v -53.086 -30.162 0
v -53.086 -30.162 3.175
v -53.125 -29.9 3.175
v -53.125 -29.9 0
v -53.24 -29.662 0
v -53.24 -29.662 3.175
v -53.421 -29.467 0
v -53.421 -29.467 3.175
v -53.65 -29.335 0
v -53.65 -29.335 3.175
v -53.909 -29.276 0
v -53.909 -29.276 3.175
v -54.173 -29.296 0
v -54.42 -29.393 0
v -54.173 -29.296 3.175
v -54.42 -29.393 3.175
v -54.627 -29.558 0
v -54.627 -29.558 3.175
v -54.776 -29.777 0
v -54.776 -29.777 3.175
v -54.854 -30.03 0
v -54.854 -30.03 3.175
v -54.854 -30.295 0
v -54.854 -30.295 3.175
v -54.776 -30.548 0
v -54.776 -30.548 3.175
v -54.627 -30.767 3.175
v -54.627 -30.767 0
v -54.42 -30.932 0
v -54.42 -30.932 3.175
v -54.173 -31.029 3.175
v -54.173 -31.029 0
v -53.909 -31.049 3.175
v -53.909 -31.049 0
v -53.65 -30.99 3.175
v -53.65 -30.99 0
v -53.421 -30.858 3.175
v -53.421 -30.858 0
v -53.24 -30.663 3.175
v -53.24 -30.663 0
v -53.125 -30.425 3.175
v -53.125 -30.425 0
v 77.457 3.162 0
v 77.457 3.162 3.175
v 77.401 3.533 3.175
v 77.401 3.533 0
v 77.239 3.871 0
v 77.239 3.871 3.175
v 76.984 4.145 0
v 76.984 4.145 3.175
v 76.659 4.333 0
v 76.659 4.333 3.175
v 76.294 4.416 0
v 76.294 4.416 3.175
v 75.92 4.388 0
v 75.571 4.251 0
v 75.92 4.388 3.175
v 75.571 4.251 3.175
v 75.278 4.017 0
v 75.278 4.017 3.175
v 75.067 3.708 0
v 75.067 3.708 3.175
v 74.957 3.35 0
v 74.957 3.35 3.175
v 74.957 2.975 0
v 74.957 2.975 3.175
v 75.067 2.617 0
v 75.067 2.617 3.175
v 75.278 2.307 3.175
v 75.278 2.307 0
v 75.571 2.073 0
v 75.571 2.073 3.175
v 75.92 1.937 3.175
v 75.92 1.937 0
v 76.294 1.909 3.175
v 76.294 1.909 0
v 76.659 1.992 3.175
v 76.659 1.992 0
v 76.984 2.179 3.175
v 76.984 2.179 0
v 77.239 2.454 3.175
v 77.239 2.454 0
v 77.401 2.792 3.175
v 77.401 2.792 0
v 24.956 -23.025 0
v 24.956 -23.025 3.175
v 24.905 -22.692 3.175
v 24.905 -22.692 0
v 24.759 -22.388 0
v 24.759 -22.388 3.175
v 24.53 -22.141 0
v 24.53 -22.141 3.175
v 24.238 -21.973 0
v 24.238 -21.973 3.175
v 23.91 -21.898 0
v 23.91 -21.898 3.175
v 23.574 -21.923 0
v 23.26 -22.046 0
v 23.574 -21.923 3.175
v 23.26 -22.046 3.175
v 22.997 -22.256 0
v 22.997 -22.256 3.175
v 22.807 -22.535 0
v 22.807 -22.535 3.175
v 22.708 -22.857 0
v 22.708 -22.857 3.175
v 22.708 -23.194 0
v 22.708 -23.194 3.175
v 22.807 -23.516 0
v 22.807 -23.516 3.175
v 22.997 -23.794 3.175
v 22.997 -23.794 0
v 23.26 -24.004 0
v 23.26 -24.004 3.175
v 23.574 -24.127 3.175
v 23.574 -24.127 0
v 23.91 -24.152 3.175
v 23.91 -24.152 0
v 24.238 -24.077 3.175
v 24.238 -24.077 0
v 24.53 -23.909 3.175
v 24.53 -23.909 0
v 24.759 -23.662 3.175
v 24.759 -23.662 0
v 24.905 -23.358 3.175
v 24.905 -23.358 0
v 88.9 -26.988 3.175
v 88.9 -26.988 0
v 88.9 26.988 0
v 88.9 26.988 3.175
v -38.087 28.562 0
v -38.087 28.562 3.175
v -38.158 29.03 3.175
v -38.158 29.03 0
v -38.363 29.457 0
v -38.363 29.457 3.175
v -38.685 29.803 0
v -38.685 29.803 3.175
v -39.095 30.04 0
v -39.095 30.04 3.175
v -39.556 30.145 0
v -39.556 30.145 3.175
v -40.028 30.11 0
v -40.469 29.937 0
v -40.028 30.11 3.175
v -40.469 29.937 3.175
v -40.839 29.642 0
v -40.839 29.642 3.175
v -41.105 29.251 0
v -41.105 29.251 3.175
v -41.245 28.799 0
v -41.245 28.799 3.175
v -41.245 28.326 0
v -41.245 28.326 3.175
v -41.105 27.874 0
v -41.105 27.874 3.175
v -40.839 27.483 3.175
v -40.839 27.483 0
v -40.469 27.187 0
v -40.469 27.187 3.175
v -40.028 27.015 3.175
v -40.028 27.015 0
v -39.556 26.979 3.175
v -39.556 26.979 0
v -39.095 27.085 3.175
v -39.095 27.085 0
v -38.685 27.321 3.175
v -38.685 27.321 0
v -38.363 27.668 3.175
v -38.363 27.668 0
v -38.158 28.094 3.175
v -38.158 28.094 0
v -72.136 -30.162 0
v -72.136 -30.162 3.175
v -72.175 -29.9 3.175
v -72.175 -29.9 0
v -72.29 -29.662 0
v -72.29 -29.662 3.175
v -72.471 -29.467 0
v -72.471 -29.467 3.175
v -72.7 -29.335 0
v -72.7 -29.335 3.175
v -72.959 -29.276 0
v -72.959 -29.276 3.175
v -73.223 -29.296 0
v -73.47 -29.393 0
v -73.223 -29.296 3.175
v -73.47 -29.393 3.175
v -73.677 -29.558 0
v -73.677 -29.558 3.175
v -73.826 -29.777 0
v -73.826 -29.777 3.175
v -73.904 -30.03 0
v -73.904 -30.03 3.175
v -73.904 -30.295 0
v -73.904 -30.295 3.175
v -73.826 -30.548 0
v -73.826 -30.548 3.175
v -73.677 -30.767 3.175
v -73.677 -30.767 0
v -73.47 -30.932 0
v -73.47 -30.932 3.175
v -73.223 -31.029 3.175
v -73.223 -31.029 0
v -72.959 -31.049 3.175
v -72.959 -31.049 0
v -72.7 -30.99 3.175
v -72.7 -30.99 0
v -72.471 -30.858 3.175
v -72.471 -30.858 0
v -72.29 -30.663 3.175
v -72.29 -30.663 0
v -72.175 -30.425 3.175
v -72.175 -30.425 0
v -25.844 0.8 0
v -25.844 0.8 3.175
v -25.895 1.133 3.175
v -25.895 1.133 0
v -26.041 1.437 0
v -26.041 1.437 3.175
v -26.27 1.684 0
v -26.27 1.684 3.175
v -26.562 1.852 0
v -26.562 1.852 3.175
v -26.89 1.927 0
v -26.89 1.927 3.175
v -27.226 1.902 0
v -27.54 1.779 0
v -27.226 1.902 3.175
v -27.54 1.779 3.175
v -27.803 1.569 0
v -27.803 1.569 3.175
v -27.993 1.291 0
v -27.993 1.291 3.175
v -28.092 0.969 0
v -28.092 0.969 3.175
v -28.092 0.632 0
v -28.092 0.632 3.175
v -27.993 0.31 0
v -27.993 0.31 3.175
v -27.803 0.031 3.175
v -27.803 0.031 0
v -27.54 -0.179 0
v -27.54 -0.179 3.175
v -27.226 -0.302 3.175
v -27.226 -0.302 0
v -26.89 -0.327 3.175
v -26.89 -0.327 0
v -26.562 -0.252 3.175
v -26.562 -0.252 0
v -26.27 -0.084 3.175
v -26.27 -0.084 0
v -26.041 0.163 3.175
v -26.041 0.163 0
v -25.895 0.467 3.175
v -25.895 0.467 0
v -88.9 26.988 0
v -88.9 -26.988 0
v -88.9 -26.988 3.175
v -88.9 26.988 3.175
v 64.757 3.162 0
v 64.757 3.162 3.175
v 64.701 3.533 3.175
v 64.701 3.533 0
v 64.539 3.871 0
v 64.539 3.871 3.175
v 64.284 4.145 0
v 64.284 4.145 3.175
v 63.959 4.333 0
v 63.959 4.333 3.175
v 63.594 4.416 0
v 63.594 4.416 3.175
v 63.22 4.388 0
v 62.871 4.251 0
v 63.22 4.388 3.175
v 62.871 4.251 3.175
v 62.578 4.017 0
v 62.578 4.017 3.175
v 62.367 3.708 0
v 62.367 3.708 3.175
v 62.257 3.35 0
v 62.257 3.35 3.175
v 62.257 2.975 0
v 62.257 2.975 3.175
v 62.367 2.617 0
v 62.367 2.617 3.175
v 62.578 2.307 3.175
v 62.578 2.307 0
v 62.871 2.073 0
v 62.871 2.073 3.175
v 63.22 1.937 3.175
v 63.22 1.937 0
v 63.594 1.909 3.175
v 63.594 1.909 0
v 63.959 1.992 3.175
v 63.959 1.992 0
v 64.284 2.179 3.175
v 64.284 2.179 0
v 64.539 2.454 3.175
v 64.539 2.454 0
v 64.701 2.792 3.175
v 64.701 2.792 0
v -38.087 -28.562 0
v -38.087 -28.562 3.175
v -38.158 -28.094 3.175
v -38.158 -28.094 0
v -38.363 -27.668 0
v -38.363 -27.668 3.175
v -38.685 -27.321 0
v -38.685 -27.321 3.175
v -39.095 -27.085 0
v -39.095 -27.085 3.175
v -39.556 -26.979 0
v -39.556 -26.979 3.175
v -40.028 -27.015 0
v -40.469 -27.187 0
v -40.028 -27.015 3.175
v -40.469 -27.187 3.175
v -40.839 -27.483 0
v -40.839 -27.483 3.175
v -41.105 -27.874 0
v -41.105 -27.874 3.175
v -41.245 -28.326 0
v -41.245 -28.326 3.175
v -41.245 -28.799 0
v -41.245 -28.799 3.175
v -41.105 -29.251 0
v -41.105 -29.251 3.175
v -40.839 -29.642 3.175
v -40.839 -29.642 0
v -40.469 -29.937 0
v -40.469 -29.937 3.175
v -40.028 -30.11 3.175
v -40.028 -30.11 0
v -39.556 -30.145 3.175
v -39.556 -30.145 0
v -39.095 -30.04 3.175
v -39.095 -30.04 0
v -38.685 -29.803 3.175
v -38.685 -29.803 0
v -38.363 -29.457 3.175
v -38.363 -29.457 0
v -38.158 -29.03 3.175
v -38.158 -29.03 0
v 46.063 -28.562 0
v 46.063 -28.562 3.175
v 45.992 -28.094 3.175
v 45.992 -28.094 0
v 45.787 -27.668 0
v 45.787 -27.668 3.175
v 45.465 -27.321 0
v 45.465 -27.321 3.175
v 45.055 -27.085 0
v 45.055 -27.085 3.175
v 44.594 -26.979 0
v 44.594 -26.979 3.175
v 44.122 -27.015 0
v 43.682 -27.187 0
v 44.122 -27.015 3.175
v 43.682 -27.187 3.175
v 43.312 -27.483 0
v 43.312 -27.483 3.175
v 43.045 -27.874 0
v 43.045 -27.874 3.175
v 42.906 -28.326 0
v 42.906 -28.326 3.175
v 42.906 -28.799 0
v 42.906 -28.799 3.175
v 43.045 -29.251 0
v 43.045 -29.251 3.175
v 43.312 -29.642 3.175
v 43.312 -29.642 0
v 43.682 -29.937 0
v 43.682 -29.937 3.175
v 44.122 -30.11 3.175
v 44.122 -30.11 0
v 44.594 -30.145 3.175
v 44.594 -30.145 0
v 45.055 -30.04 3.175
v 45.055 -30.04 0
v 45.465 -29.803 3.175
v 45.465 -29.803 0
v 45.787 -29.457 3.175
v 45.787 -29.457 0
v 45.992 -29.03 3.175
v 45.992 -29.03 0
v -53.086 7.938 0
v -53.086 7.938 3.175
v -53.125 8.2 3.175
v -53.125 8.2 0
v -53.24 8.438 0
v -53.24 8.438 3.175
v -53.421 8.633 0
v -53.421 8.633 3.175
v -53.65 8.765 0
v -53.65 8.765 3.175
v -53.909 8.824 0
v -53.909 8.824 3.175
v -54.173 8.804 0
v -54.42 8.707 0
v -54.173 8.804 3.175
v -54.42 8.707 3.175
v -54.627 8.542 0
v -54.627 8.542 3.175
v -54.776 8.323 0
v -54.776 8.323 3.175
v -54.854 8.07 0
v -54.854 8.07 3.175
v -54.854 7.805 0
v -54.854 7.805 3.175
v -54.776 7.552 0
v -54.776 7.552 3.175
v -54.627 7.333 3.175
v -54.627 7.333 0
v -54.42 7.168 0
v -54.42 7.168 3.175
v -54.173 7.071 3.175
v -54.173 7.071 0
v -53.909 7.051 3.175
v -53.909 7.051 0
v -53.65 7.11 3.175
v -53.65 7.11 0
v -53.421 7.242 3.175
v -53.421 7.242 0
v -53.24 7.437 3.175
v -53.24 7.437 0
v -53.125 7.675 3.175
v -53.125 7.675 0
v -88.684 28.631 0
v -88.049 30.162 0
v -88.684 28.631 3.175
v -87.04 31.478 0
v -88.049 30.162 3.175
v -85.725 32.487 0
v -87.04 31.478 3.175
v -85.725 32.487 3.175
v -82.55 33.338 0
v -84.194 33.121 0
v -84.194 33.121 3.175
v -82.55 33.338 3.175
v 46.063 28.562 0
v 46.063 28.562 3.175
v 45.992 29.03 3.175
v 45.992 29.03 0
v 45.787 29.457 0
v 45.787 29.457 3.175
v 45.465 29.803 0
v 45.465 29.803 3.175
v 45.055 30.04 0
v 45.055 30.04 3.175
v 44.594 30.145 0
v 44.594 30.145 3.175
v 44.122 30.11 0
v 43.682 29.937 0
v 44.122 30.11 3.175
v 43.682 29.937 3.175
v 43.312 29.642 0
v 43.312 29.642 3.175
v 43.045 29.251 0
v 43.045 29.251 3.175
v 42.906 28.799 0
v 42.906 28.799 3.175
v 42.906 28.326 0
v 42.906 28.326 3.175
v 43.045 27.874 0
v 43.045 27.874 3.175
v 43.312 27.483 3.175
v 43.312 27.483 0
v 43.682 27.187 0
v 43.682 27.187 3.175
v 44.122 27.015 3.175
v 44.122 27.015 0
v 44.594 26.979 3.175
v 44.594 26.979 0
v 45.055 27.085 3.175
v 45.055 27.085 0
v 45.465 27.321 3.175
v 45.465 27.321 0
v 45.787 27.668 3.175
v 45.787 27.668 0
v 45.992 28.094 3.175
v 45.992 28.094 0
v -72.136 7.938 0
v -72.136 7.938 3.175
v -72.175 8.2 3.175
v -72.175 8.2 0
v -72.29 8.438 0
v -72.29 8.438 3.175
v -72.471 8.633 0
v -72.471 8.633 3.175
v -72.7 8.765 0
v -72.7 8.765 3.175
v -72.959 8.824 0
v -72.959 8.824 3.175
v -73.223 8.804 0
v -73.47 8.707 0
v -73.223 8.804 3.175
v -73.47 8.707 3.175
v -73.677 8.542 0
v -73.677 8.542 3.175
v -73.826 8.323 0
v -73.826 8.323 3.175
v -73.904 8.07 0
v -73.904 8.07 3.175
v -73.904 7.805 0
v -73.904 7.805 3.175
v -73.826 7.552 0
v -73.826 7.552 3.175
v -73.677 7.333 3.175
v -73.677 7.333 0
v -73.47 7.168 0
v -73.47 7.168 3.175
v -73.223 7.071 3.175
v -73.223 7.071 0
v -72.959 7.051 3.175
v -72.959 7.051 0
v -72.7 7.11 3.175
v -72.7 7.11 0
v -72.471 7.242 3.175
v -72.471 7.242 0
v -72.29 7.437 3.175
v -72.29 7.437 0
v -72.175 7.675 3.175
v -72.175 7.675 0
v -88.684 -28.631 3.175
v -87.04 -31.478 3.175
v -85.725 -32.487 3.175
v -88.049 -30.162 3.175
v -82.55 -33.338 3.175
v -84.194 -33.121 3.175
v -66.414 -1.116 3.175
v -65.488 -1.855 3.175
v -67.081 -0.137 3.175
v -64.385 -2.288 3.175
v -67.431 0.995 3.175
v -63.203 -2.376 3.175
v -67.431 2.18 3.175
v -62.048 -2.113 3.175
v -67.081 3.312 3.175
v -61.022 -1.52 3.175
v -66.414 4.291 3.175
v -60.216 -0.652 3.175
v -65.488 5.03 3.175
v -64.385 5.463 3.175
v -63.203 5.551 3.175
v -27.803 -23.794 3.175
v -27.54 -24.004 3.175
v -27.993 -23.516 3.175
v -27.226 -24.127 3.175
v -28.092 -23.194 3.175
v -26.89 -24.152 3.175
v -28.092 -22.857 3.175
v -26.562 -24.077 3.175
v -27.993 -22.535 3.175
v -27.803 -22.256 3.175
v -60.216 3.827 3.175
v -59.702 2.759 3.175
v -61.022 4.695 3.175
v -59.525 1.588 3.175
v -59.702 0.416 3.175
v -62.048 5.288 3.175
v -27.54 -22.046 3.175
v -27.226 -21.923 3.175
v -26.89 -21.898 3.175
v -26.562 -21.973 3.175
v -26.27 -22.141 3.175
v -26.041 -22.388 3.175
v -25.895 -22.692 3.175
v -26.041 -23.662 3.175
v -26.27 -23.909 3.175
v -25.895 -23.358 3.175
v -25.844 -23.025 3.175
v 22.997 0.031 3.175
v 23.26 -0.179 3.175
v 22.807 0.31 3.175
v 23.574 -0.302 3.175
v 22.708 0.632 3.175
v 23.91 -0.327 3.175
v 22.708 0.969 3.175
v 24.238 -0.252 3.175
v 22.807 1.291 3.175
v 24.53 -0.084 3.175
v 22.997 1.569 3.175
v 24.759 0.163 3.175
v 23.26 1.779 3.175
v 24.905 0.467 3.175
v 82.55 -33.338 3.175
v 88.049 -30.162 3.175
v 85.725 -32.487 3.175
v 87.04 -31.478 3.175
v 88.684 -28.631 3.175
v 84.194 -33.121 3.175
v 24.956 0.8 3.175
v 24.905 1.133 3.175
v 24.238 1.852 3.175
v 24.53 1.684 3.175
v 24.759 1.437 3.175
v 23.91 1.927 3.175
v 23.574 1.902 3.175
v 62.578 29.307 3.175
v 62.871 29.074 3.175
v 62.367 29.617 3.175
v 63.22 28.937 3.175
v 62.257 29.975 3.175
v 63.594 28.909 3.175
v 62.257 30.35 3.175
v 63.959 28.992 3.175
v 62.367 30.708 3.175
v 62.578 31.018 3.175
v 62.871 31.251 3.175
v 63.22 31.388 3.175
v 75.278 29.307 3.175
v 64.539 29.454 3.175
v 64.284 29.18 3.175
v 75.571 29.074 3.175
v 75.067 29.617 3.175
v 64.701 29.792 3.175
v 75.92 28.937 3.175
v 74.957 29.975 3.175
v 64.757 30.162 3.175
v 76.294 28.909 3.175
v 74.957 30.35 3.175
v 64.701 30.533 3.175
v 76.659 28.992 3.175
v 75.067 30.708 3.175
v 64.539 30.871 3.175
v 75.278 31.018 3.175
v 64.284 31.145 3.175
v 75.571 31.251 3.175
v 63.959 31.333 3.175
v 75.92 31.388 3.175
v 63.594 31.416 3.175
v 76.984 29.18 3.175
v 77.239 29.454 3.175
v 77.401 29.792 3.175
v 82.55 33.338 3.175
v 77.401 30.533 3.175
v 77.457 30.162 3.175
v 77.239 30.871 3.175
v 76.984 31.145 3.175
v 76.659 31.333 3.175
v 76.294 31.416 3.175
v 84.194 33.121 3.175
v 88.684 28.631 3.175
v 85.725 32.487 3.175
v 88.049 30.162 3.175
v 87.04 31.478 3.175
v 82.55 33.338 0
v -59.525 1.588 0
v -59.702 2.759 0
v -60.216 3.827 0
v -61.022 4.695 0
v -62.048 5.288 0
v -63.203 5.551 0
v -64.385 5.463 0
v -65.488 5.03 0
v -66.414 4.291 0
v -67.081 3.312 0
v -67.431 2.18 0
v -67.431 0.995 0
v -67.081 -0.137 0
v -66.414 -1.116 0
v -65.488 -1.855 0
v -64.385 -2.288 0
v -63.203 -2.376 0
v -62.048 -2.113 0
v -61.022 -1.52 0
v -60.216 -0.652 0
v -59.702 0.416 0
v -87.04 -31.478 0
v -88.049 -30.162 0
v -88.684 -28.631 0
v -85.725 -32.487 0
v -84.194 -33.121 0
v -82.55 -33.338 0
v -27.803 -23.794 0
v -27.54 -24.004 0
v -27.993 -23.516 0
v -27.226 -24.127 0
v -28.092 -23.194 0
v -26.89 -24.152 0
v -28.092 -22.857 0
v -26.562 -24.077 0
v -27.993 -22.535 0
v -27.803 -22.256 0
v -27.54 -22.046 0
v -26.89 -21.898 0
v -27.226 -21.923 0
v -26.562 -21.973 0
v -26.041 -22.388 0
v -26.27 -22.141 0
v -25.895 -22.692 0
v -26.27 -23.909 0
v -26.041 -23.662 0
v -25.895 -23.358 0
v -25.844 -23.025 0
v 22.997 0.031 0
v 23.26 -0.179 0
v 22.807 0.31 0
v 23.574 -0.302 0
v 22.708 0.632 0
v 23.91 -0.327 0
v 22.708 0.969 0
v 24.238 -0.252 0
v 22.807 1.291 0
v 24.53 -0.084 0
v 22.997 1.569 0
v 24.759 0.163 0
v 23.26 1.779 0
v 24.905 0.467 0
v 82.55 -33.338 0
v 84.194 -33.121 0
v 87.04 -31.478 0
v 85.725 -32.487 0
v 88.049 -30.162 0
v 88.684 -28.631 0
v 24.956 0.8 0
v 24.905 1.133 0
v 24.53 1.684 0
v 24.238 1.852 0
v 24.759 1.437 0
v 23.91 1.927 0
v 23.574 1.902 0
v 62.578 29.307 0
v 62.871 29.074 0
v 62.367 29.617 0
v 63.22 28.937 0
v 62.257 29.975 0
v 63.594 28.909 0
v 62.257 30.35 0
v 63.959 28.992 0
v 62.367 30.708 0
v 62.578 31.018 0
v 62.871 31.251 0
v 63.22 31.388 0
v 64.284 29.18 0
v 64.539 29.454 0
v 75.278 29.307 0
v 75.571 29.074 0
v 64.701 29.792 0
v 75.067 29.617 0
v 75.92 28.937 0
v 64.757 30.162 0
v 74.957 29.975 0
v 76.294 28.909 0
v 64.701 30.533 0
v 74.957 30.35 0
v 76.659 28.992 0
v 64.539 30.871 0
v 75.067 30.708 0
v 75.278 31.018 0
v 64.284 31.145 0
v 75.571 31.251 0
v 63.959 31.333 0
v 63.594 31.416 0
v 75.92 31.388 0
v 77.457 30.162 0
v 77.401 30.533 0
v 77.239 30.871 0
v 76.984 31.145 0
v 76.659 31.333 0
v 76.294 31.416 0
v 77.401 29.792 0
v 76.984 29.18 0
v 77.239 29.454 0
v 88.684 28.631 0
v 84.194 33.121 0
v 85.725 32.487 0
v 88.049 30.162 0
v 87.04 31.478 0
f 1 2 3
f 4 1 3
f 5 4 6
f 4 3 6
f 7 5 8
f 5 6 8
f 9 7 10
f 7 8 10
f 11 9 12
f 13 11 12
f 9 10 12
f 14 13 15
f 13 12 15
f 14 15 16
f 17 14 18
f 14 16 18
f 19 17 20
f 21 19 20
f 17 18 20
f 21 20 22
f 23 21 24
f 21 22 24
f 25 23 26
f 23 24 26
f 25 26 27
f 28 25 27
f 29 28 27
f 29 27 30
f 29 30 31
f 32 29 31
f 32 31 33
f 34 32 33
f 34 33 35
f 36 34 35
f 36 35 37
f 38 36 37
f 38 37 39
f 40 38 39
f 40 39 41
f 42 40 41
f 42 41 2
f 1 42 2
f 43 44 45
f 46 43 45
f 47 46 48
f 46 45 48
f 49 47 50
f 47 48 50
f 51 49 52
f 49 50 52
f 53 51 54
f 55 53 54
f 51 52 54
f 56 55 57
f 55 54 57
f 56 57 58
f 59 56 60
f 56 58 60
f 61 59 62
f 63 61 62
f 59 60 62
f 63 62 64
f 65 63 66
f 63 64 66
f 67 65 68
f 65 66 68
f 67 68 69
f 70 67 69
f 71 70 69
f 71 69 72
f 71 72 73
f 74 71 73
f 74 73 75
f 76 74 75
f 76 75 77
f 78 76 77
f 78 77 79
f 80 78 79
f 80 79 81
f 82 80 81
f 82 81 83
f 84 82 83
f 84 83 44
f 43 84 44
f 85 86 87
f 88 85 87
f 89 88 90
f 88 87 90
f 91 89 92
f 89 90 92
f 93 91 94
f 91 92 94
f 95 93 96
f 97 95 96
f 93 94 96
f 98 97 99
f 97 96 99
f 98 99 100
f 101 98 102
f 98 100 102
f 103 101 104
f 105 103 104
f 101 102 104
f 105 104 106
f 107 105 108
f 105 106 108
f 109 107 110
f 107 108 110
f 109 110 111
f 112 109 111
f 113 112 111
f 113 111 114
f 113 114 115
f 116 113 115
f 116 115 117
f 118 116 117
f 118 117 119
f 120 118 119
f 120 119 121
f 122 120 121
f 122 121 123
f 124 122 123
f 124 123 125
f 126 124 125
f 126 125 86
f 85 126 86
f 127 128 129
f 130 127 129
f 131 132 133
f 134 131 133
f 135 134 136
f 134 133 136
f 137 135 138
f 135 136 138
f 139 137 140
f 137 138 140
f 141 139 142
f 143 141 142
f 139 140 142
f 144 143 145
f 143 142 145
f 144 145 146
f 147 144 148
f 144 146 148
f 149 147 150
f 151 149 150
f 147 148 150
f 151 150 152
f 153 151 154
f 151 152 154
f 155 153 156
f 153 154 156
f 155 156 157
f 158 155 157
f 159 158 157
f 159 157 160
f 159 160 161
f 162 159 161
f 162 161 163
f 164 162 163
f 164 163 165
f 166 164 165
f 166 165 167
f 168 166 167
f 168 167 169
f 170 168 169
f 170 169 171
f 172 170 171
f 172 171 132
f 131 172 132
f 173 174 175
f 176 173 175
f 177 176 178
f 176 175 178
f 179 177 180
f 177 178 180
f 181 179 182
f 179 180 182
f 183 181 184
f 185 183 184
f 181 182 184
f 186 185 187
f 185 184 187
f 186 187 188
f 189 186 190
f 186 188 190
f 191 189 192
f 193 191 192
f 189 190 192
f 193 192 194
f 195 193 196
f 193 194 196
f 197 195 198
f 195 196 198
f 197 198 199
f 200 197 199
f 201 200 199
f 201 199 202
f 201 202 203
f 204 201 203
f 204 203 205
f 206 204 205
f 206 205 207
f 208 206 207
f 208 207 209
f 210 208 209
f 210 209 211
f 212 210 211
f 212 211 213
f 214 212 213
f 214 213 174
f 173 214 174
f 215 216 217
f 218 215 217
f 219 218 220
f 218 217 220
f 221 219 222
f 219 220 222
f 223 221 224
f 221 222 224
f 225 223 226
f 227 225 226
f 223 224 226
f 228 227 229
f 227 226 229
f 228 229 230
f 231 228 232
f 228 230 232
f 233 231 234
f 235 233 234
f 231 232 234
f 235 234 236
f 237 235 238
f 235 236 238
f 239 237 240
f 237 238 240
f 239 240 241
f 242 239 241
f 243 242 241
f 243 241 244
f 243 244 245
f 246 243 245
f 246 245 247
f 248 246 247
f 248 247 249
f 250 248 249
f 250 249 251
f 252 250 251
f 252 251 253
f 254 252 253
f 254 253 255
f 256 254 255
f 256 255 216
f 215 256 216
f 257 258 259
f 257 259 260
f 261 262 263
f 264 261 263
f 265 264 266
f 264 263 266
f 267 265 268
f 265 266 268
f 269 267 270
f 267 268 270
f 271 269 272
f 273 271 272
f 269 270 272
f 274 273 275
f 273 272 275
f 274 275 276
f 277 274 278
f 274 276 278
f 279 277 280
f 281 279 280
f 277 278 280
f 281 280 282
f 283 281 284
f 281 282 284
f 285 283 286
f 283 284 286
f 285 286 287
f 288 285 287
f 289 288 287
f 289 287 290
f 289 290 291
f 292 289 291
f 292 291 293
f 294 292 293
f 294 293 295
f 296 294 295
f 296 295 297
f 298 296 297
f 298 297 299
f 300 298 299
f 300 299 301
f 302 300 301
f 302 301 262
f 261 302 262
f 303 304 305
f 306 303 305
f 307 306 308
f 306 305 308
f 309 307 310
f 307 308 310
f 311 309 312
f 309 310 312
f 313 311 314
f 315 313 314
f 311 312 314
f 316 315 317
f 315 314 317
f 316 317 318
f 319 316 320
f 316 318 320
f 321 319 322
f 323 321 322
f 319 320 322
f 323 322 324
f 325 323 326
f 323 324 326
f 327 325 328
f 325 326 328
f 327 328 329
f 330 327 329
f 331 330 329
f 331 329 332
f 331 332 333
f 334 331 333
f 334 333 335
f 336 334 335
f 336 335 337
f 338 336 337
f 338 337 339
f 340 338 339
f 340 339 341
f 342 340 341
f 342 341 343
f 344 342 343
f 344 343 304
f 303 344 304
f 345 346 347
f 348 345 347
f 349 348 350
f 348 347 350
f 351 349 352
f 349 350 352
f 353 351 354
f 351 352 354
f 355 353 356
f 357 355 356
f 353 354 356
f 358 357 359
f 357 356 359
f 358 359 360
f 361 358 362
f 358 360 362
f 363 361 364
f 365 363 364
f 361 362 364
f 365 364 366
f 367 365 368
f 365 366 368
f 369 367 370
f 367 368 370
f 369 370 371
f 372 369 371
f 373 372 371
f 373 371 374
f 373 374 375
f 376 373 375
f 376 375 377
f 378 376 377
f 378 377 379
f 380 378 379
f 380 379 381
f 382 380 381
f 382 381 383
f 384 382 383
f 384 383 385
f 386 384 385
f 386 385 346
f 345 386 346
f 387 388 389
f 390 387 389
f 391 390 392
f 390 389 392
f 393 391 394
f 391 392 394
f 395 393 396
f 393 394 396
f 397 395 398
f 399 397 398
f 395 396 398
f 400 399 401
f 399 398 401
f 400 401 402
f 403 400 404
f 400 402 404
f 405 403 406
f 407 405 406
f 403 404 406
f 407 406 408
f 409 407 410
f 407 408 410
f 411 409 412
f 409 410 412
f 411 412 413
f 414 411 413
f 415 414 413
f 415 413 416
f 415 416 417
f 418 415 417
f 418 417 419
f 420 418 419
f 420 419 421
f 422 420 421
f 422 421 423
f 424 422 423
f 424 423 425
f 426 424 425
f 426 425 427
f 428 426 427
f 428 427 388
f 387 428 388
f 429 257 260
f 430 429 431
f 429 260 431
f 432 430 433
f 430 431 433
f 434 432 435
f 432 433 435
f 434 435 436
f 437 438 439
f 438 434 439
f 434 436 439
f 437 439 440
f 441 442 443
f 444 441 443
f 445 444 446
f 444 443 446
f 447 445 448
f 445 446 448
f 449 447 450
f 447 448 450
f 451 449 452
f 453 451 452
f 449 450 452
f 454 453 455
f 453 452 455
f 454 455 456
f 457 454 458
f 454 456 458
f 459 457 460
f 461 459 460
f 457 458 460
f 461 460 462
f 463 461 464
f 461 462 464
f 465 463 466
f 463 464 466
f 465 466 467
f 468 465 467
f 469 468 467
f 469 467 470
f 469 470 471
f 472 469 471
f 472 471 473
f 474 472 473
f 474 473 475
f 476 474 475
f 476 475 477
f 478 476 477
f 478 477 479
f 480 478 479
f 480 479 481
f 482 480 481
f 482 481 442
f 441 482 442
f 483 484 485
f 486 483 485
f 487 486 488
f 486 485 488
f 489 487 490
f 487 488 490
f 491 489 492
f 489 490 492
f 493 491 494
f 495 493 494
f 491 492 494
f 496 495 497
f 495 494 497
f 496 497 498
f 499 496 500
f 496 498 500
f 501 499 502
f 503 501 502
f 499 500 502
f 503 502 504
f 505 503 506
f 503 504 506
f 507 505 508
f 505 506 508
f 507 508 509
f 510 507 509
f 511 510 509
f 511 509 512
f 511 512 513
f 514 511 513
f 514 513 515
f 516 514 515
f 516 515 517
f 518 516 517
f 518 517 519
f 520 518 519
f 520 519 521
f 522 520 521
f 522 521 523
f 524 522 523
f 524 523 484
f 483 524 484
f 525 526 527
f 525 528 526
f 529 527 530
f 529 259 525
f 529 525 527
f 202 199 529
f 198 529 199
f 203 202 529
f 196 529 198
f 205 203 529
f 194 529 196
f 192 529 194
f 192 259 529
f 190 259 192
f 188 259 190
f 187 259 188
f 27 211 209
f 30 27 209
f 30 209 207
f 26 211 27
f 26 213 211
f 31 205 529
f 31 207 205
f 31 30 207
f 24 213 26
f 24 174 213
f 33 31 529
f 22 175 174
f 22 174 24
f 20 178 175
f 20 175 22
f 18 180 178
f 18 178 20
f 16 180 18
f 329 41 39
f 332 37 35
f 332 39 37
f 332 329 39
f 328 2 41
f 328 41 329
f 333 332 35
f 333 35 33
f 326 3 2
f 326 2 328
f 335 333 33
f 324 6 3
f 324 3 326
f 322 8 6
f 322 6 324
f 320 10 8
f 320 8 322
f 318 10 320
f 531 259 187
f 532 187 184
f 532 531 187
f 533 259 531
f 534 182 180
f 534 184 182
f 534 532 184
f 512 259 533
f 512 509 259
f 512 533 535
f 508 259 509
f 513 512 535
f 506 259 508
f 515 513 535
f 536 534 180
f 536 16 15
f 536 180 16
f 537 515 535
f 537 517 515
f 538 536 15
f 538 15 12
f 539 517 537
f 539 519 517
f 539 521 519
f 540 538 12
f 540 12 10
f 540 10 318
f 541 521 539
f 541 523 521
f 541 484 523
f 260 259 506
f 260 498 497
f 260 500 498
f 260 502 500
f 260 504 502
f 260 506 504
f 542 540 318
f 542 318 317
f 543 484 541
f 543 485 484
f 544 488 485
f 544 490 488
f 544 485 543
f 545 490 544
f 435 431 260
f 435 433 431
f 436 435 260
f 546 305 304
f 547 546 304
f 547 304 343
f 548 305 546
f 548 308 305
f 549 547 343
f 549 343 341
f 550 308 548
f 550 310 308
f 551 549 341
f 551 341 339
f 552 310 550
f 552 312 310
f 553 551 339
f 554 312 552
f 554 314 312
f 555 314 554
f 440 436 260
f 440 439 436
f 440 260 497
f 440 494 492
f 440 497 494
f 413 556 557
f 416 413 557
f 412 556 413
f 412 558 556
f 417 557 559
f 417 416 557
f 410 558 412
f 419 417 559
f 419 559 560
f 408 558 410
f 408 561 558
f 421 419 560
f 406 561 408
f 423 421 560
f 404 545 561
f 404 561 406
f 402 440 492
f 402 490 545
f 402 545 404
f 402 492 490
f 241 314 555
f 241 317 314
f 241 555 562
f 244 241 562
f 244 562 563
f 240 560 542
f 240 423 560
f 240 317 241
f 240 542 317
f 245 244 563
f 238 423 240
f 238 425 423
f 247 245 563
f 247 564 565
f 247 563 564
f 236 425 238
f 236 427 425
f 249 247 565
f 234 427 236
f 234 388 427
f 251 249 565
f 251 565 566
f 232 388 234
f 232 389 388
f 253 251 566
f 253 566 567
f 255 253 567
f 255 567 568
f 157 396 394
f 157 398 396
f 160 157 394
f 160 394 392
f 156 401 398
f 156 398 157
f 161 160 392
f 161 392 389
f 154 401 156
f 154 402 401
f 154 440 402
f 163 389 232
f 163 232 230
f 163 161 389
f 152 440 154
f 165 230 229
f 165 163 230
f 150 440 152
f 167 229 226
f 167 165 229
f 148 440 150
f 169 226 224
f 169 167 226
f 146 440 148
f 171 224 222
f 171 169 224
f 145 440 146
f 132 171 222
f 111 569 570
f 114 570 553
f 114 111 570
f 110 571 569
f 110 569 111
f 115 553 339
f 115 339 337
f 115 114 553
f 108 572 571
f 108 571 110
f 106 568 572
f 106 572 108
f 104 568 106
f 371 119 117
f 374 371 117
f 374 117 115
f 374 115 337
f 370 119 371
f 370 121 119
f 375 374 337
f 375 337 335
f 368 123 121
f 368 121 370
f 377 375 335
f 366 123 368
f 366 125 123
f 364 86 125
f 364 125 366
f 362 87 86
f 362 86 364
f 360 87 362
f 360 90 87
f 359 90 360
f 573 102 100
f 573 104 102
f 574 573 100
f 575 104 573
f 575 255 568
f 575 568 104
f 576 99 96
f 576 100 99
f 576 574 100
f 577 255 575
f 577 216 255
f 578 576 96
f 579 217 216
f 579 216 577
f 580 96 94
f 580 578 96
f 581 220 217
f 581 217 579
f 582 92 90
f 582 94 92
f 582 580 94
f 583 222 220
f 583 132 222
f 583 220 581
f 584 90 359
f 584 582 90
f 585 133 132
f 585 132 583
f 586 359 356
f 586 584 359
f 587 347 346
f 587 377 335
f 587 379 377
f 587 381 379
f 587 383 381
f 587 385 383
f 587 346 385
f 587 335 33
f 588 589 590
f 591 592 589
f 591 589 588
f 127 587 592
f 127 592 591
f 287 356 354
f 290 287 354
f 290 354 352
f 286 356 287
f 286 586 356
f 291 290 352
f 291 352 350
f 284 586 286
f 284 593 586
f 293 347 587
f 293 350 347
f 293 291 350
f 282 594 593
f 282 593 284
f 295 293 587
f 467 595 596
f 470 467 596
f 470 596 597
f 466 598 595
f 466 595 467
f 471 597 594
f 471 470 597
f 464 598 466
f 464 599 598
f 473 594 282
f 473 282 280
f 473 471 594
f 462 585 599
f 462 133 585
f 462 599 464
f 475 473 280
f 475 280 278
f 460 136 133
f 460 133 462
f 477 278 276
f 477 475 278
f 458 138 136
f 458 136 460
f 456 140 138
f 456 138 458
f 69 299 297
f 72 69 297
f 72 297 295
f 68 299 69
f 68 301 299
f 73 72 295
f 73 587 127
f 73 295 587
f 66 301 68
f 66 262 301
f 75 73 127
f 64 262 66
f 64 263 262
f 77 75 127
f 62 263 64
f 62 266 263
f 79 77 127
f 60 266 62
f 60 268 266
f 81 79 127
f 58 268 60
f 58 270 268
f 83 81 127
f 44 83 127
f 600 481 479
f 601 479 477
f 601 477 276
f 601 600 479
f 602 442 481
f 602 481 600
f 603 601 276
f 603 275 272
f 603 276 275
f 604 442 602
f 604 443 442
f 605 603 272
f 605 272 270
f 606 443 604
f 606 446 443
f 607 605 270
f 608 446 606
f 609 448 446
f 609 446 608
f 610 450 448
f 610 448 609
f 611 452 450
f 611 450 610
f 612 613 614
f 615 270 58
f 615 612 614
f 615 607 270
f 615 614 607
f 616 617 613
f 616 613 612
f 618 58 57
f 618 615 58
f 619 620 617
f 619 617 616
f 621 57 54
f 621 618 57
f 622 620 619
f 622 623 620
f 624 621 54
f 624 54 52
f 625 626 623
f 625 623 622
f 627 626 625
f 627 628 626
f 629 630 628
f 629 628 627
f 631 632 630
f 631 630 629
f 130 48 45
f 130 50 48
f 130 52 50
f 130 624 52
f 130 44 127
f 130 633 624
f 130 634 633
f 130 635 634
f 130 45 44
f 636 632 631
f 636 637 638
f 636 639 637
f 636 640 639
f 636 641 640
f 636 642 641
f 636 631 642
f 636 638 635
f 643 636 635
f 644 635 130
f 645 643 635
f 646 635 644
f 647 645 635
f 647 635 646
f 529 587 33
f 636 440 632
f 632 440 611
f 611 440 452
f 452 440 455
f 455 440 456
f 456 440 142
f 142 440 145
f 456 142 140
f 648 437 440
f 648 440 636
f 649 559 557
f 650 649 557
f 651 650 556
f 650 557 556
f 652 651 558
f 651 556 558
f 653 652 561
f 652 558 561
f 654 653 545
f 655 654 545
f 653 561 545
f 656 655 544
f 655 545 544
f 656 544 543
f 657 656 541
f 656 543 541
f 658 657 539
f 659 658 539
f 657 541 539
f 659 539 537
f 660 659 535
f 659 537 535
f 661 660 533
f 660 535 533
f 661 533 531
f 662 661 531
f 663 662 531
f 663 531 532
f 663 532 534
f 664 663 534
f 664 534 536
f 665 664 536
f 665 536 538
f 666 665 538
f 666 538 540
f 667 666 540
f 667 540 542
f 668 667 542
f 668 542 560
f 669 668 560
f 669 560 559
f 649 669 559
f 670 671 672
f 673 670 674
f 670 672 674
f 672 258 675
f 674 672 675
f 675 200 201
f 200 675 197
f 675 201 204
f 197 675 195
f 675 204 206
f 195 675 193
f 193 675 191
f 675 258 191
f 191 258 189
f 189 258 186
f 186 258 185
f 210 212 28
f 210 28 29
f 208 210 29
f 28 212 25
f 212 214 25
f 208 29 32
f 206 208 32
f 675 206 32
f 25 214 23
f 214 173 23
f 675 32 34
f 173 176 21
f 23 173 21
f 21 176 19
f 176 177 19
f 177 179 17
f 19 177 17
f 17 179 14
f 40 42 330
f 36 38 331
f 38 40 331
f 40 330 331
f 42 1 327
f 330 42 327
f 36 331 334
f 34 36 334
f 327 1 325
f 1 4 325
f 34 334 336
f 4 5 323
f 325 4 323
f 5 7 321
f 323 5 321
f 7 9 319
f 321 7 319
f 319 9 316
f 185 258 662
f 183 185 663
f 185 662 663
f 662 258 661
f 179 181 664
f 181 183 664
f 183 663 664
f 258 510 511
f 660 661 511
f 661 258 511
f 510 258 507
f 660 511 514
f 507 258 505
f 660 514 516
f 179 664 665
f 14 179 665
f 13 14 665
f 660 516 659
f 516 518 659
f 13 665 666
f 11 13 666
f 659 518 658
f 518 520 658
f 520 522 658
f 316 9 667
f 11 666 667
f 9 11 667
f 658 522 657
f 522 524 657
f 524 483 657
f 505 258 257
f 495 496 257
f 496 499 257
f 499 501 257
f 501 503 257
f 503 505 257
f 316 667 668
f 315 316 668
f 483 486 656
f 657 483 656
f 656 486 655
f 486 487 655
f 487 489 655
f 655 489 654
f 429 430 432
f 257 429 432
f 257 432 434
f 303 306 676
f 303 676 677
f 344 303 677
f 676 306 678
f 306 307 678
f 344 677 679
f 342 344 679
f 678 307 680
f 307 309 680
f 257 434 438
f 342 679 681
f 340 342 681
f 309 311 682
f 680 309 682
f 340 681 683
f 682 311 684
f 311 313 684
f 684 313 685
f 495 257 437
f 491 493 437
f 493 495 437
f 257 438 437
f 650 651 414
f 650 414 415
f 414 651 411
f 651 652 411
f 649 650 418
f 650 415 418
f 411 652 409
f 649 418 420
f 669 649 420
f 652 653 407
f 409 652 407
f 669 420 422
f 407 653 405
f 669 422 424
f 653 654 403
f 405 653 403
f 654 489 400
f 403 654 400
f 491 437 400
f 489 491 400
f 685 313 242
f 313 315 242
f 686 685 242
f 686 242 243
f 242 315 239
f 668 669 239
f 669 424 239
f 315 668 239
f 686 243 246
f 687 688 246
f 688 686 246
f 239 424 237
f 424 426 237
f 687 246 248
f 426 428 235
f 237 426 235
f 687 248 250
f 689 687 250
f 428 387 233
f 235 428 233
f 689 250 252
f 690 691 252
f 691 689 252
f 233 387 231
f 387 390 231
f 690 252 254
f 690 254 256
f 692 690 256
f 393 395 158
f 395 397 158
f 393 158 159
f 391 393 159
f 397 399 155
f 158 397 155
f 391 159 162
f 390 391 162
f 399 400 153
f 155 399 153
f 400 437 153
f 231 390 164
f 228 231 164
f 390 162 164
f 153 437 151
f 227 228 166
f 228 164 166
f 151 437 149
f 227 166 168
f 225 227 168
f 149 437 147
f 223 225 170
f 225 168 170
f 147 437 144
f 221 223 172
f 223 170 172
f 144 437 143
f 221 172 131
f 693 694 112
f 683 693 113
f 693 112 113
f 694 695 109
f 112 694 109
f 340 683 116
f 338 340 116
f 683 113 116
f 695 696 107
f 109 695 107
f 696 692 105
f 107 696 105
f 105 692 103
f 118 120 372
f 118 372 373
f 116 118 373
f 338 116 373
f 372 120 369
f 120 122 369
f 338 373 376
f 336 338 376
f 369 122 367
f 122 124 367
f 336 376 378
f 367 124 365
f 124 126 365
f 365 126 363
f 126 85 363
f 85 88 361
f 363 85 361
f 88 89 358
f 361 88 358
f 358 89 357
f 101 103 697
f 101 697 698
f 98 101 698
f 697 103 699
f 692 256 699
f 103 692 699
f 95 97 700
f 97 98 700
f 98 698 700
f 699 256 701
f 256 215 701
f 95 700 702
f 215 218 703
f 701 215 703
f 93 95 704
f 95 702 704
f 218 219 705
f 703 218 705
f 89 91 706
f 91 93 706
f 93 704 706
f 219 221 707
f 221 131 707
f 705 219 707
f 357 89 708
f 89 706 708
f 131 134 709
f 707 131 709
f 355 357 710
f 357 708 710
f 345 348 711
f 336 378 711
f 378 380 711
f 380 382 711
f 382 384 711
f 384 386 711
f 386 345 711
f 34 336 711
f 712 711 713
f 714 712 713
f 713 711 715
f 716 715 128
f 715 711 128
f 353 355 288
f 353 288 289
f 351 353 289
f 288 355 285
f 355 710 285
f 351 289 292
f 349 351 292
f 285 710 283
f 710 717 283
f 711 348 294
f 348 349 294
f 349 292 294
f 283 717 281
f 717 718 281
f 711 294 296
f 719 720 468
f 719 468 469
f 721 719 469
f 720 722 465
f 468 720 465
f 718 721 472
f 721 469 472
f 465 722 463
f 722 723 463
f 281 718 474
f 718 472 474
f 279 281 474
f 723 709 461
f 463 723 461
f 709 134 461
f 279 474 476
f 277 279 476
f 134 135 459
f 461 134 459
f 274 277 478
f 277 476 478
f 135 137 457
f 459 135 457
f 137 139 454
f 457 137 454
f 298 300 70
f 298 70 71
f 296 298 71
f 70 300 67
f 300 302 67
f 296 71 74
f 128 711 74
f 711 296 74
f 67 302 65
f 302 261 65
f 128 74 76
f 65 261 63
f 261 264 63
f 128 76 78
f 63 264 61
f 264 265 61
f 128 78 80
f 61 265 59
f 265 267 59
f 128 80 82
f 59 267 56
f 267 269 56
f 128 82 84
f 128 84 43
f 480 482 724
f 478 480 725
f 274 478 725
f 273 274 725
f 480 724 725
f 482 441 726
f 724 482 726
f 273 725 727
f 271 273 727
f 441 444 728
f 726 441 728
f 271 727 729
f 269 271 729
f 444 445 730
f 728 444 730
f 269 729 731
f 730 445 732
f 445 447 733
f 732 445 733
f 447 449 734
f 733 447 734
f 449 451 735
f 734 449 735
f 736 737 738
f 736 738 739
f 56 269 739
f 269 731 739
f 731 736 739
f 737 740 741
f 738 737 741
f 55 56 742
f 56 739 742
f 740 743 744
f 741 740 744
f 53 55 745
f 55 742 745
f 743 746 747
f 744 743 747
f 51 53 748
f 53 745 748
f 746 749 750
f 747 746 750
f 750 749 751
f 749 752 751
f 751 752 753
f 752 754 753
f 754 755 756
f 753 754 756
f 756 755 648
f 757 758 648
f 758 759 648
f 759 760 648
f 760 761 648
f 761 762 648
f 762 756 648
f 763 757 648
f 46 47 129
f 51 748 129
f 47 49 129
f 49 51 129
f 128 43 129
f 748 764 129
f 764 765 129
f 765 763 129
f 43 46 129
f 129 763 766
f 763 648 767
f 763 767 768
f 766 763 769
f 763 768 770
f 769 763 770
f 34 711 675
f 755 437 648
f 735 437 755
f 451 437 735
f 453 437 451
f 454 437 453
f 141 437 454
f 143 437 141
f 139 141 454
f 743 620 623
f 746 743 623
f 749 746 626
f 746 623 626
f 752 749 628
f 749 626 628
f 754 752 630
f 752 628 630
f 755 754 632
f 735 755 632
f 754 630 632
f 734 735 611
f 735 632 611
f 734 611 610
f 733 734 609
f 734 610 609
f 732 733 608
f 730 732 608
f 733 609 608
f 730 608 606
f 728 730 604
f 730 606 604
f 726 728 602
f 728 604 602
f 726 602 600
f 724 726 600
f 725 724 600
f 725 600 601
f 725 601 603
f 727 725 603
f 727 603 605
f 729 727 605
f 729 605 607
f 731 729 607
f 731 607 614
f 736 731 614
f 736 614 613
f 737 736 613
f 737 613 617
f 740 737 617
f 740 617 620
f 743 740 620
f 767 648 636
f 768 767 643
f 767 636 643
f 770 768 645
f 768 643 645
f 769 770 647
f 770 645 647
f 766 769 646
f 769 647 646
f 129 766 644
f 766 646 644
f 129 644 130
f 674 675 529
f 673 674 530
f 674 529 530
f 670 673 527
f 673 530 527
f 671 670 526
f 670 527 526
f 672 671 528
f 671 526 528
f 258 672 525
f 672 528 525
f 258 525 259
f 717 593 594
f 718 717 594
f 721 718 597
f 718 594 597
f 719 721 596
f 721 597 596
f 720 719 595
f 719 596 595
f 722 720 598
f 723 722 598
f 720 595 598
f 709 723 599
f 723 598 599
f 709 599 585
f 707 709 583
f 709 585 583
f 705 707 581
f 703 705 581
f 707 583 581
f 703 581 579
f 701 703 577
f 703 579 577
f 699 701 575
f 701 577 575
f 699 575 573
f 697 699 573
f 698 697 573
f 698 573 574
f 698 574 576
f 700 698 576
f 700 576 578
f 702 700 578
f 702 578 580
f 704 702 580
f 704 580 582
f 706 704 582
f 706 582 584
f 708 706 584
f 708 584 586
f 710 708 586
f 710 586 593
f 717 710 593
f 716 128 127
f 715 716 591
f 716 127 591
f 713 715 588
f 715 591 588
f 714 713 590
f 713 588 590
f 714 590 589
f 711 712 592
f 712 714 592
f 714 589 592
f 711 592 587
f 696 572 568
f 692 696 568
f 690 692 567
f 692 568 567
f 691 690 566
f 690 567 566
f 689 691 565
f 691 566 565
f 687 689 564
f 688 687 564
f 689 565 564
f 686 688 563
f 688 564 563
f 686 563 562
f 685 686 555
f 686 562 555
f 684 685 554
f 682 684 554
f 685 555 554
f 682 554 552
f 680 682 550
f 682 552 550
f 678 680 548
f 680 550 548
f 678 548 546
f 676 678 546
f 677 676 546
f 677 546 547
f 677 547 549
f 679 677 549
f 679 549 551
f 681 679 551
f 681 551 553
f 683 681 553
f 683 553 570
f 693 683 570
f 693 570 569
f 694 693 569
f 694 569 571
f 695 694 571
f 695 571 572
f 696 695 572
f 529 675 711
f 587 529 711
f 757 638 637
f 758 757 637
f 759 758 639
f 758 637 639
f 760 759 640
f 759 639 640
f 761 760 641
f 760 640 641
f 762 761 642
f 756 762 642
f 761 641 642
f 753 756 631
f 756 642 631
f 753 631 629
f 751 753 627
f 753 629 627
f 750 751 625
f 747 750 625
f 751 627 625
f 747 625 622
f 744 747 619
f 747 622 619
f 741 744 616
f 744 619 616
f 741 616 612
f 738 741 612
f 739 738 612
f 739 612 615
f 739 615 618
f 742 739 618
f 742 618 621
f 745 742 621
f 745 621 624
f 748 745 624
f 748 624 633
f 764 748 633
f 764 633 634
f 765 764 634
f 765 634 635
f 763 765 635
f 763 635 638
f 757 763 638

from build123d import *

# Parameters (mm, degrees)
F0_W      = 177.8
F0_H      = 66.675
F1_DEPTH  = 3.175
F3_DEPTH  = 3.176
F5_DEPTH  = 3.176
F6_R      = 1.2573
F7_DEPTH  = 3.176
F8_R      = 1.5875
F9_DEPTH  = 3.176
F10_R     = 0.889
F11_DEPTH = 3.176
F12_R     = 3.9751
F13_DEPTH = 3.176
F14_R     = 1.1303
F15_DEPTH = 3.176


with BuildPart() as f1:
    # F0 (on Top) → F1 (new body)
    with BuildSketch(Plane.XY):
        Rectangle(F0_W, F0_H)
    extrude(amount=F1_DEPTH)

    # F2 (on face) → F3 (cut, through all)
    with BuildSketch(Plane.XY.offset(3.175)):
        with BuildLine():
            ThreePointArc((-88.9, 26.9875), (-87.040128, 31.477628), (-82.55, 33.3375))
            Line((-82.55, 33.3375), (-88.9, 33.3375))
            Line((-88.9, 33.3375), (-88.9, 26.9875))
        make_face()
    extrude(amount=-F3_DEPTH, mode=Mode.SUBTRACT)

    # F4 (on face) → F5 (cut, through all)
    with BuildSketch(Plane.XY.offset(3.175)):
        with BuildLine():
            Line((88.9, 33.3375), (82.55, 33.3375))
            ThreePointArc((82.55, 33.3375), (87.040128, 31.477628), (88.9, 26.9875))
            Line((88.9, 26.9875), (88.9, 33.3375))
        make_face()
        with BuildLine():
            ThreePointArc((88.9, -26.9875), (87.040128, -31.477628), (82.55, -33.3375))
            Line((82.55, -33.3375), (88.9, -33.3375))
            Line((88.9, -33.3375), (88.9, -26.9875))
        make_face()
        with BuildLine():
            ThreePointArc((-82.55, -33.3375), (-87.040128, -31.477628), (-88.9, -26.9875))
            Line((-88.9, -26.9875), (-88.9, -33.3375))
            Line((-88.9, -33.3375), (-82.55, -33.3375))
        make_face()
    extrude(amount=-F5_DEPTH, mode=Mode.SUBTRACT)

    # F6 (on face) → F7 (cut, through all)
    with BuildSketch(Plane.XY.offset(3.175)):
        with Locations((63.5, 30.1625)):
            Circle(F6_R)
        with Locations((76.2, 30.1625)):
            Circle(F6_R)
        with Locations((63.5, 3.1623)):
            Circle(F6_R)
        with Locations((76.2, 3.1623)):
            Circle(F6_R)
    extrude(amount=-F7_DEPTH, mode=Mode.SUBTRACT)

    # F8 (on face) → F9 (cut, through all)
    with BuildSketch(Plane.XY.offset(3.175)):
        with Locations((44.4754, 28.5623)):
            Circle(F8_R)
        with Locations((-39.6748, 28.5623)):
            Circle(F8_R)
        with Locations((-39.6748, -28.5623)):
            Circle(F8_R)
        with Locations((44.4754, -28.5623)):
            Circle(F8_R)
    extrude(amount=-F9_DEPTH, mode=Mode.SUBTRACT)

    # F10 (on face) → F11 (cut, through all)
    with BuildSketch(Plane.XY.offset(3.175)):
        with Locations((-73.025, 7.9375)):
            Circle(F10_R)
        with Locations((-53.975, 7.9375)):
            Circle(F10_R)
        with Locations((-73.025, -30.1625)):
            Circle(F10_R)
        with Locations((-53.975, -30.1625)):
            Circle(F10_R)
    extrude(amount=-F11_DEPTH, mode=Mode.SUBTRACT)

    # F12 (on face) → F13 (cut, through all)
    with BuildSketch(Plane.XY.offset(3.175)):
        with Locations((-63.5, 1.5875)):
            Circle(F12_R)
    extrude(amount=-F13_DEPTH, mode=Mode.SUBTRACT)

    # F14 (on face) → F15 (cut, through all)
    with BuildSketch(Plane.XY.offset(3.175)):
        with Locations((-26.9748, 0.8001)):
            Circle(F14_R)
        with Locations((23.8252, 0.8001)):
            Circle(F14_R)
        with Locations((23.8252, -23.0251)):
            Circle(F14_R)
        with Locations((-26.9748, -23.0251)):
            Circle(F14_R)
    extrude(amount=-F15_DEPTH, mode=Mode.SUBTRACT)


solid = f1.part
